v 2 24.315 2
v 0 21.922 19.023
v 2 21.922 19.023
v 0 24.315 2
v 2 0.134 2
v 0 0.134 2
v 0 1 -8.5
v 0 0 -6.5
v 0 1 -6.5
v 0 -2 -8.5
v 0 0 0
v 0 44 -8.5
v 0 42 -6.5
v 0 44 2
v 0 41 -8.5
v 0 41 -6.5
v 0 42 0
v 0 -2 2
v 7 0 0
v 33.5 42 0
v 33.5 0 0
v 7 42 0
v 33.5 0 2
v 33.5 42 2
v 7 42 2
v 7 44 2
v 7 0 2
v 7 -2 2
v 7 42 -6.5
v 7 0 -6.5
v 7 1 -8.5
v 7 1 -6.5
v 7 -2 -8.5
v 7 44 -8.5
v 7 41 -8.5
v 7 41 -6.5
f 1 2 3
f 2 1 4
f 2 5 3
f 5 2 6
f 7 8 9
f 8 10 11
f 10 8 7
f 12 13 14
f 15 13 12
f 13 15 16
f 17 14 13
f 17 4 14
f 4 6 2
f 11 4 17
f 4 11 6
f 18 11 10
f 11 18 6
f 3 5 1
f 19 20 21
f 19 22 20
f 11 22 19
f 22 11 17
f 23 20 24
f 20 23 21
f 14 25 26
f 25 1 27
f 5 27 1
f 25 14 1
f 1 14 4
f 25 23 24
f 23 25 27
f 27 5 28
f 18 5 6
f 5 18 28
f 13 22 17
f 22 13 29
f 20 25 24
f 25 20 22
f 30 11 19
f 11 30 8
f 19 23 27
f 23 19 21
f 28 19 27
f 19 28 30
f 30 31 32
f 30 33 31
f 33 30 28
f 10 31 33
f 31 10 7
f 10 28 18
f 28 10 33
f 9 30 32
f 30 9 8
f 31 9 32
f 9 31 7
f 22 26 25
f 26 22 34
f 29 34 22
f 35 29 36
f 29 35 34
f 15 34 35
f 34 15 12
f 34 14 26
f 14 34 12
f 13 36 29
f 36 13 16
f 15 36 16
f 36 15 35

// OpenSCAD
// file: ../gospel.scad
/**
 * GOSPEL: George's OpenSCAD Procedural Enhancement Library
 * @author glaza
 *
 * Index:
 *      Translation: x, y, z, xy, xz, yz, xyz (displacement, variation)
 *      Scaling:     sx, sy, sz, sxy, sxz, syz, s (factor, variation)
 *      Rotation:    rx, ry, rz (angle, variation)
 *      Duplication: dx, dy, dz ()
 */

/**
 * Translates the children in the X,Y,Z direction
 * @param d Displacement in X,Y,Z direction
 * @param variation The random variation + or - added to the displacement * 
 *  x      Translate X
 *  y      Translate Y
 *  z      Translate Z
 *  xy     Translate equaly in X and Y
 *  xz     Translate equaly in X and Z
 *  yz     Translate equaly in Y and Z
 *  xyz    Translate equaly in X, Y and Z
 */
module x(dx, variation=0) 
{   
    vx = rands(-variation,variation,1)[0];
    translate([dx+vx,0,0])
    children();
}
module y(dy, variation=0) 
{   
    vy = rands(-variation,variation,1)[0];
    translate([0,dy+vy,0])
    children();
} 
module z(dz, variation=0) 
{   
    vz = rands(-variation,variation,1)[0];
    translate([0,0,dz+vz])
    children();
}
module xy(d, variation=0) 
{   
    x(d, variation)
    y(d, variation)
    children();
}
module yz(d, variation=0) 
{   
    z(d, variation)
    y(d, variation)
    children();
}
module xz(d, variation=0) 
{   
    x(d, variation)
    z(d, variation)
    children();
}
module xyz(d, variation=0) 
{   
    xy(d, variation)
    z(d, variation)
    children();
}

/**
 * Rotates the children around the X axis
 * @param angle Degrees to rotate around the X axis
 * @param variation The random variation + or - added
 *  rx     Rotate around X
 *  ry     Rotate around Y
 *  rz     Rotate around Z
 */
module rx(angle, variation=0) 
{   
    v = rands(-variation,variation,1)[0];
    rotate([angle+v,0,0])
    children();
}
module ry(angle, variation=0) 
{   
    v = rands(-variation,variation,1)[0];
    rotate([0,angle+v,0,0])
    children();
}
module rz(angle, variation=0) 
{   
    v = rands(-variation,variation,1)[0];
    rotate([0,0,angle+v])
    children();
}

/**
 * Duplicates the children across the different planes.
 *      dx: YZ plane, dy: XZ plane, dz: XY plane
 */
module dx() 
{
    mirror([1,0,0])
    children();

    children();
}
module dy() 
{
    mirror([0,1,0])
    children();

    children();
}
module dz() 
{
    mirror([0,0,1])
    children();

    children();
}

/**
 * Mirrors across diferent planes.
 *      mx: YZ plane, my: XZ plane, mz: XY plane
 */
module mx() 
{
    mirror([1,0,0])
    children();
}
module my() 
{
    mirror([0,1,0])
    children();
}
module mz() 
{
    mirror([0,0,1])
    children();
}

/**
 * Scales in different directions
 *      mx: YZ plane, my: XZ plane, mz: XY plane
 */
module sx(factor, variation=0) 
{   
    v = rands(-variation,variation,1)[0];
    scale([factor+v,1,1])
    children();
}
module sy(factor, variation=0) 
{   
    v = rands(-variation,variation,1)[0];
    scale([1,factor+v,1])
    children();
} 
module sz(factor, variation=0) 
{   
    v = rands(-variation,variation,1)[0];
    scale([1,1,factor+v])
    children();
}
module sxy(factor, variation=0) 
{   
    sx(factor, variation)
    sy(factor, variation)
    children();
}
module syz(factor, variation=0) 
{   
    sz(factor, variation)
    sy(factor, variation)
    children();
}
module sxz(d, variation=0) 
{   
    sx(factor, variation)
    sz(factor, variation)
    children();
}
module s(factor, variation=0) 
{   
    sxy(factor, variation)
    sz(factor, variation)
    children();
}

/**
 * Shortcuts
 */
module diff() //does not work
{
    difference()
    {
        children();
    }
}


/**
 * Colours
 */
module red()
{
    color("Red")
    children();
}
module blue()
{
    color("RoyalBlue")
    children();
}
module black()
{
    color("Black")
    children();
}
module white()
{
    color("White")
    children();
}
// main file
include <../gospel.scad>

WALL = 2;

cube([33.5,42, WALL]);

difference()
{
    rx(-22)
    x(WALL) y(13.2) z(9.85)
    ry(-90)
    cylinder(r=16, $fn=3, h=WALL);

    z(-20)
    cube([10,60,40], center=true);
}


y(-WALL) z(-WALL-6.5)
cube([7.0,WALL,WALL+6.5+WALL]);

z(-6.5-WALL)
cube([7.0,1,WALL]);

y(42) z(-WALL-6.5)
cube([7.0,WALL,WALL+6.5+WALL]);

y(42-1) z(-6.5-WALL)
cube([7.0,1,WALL]);
